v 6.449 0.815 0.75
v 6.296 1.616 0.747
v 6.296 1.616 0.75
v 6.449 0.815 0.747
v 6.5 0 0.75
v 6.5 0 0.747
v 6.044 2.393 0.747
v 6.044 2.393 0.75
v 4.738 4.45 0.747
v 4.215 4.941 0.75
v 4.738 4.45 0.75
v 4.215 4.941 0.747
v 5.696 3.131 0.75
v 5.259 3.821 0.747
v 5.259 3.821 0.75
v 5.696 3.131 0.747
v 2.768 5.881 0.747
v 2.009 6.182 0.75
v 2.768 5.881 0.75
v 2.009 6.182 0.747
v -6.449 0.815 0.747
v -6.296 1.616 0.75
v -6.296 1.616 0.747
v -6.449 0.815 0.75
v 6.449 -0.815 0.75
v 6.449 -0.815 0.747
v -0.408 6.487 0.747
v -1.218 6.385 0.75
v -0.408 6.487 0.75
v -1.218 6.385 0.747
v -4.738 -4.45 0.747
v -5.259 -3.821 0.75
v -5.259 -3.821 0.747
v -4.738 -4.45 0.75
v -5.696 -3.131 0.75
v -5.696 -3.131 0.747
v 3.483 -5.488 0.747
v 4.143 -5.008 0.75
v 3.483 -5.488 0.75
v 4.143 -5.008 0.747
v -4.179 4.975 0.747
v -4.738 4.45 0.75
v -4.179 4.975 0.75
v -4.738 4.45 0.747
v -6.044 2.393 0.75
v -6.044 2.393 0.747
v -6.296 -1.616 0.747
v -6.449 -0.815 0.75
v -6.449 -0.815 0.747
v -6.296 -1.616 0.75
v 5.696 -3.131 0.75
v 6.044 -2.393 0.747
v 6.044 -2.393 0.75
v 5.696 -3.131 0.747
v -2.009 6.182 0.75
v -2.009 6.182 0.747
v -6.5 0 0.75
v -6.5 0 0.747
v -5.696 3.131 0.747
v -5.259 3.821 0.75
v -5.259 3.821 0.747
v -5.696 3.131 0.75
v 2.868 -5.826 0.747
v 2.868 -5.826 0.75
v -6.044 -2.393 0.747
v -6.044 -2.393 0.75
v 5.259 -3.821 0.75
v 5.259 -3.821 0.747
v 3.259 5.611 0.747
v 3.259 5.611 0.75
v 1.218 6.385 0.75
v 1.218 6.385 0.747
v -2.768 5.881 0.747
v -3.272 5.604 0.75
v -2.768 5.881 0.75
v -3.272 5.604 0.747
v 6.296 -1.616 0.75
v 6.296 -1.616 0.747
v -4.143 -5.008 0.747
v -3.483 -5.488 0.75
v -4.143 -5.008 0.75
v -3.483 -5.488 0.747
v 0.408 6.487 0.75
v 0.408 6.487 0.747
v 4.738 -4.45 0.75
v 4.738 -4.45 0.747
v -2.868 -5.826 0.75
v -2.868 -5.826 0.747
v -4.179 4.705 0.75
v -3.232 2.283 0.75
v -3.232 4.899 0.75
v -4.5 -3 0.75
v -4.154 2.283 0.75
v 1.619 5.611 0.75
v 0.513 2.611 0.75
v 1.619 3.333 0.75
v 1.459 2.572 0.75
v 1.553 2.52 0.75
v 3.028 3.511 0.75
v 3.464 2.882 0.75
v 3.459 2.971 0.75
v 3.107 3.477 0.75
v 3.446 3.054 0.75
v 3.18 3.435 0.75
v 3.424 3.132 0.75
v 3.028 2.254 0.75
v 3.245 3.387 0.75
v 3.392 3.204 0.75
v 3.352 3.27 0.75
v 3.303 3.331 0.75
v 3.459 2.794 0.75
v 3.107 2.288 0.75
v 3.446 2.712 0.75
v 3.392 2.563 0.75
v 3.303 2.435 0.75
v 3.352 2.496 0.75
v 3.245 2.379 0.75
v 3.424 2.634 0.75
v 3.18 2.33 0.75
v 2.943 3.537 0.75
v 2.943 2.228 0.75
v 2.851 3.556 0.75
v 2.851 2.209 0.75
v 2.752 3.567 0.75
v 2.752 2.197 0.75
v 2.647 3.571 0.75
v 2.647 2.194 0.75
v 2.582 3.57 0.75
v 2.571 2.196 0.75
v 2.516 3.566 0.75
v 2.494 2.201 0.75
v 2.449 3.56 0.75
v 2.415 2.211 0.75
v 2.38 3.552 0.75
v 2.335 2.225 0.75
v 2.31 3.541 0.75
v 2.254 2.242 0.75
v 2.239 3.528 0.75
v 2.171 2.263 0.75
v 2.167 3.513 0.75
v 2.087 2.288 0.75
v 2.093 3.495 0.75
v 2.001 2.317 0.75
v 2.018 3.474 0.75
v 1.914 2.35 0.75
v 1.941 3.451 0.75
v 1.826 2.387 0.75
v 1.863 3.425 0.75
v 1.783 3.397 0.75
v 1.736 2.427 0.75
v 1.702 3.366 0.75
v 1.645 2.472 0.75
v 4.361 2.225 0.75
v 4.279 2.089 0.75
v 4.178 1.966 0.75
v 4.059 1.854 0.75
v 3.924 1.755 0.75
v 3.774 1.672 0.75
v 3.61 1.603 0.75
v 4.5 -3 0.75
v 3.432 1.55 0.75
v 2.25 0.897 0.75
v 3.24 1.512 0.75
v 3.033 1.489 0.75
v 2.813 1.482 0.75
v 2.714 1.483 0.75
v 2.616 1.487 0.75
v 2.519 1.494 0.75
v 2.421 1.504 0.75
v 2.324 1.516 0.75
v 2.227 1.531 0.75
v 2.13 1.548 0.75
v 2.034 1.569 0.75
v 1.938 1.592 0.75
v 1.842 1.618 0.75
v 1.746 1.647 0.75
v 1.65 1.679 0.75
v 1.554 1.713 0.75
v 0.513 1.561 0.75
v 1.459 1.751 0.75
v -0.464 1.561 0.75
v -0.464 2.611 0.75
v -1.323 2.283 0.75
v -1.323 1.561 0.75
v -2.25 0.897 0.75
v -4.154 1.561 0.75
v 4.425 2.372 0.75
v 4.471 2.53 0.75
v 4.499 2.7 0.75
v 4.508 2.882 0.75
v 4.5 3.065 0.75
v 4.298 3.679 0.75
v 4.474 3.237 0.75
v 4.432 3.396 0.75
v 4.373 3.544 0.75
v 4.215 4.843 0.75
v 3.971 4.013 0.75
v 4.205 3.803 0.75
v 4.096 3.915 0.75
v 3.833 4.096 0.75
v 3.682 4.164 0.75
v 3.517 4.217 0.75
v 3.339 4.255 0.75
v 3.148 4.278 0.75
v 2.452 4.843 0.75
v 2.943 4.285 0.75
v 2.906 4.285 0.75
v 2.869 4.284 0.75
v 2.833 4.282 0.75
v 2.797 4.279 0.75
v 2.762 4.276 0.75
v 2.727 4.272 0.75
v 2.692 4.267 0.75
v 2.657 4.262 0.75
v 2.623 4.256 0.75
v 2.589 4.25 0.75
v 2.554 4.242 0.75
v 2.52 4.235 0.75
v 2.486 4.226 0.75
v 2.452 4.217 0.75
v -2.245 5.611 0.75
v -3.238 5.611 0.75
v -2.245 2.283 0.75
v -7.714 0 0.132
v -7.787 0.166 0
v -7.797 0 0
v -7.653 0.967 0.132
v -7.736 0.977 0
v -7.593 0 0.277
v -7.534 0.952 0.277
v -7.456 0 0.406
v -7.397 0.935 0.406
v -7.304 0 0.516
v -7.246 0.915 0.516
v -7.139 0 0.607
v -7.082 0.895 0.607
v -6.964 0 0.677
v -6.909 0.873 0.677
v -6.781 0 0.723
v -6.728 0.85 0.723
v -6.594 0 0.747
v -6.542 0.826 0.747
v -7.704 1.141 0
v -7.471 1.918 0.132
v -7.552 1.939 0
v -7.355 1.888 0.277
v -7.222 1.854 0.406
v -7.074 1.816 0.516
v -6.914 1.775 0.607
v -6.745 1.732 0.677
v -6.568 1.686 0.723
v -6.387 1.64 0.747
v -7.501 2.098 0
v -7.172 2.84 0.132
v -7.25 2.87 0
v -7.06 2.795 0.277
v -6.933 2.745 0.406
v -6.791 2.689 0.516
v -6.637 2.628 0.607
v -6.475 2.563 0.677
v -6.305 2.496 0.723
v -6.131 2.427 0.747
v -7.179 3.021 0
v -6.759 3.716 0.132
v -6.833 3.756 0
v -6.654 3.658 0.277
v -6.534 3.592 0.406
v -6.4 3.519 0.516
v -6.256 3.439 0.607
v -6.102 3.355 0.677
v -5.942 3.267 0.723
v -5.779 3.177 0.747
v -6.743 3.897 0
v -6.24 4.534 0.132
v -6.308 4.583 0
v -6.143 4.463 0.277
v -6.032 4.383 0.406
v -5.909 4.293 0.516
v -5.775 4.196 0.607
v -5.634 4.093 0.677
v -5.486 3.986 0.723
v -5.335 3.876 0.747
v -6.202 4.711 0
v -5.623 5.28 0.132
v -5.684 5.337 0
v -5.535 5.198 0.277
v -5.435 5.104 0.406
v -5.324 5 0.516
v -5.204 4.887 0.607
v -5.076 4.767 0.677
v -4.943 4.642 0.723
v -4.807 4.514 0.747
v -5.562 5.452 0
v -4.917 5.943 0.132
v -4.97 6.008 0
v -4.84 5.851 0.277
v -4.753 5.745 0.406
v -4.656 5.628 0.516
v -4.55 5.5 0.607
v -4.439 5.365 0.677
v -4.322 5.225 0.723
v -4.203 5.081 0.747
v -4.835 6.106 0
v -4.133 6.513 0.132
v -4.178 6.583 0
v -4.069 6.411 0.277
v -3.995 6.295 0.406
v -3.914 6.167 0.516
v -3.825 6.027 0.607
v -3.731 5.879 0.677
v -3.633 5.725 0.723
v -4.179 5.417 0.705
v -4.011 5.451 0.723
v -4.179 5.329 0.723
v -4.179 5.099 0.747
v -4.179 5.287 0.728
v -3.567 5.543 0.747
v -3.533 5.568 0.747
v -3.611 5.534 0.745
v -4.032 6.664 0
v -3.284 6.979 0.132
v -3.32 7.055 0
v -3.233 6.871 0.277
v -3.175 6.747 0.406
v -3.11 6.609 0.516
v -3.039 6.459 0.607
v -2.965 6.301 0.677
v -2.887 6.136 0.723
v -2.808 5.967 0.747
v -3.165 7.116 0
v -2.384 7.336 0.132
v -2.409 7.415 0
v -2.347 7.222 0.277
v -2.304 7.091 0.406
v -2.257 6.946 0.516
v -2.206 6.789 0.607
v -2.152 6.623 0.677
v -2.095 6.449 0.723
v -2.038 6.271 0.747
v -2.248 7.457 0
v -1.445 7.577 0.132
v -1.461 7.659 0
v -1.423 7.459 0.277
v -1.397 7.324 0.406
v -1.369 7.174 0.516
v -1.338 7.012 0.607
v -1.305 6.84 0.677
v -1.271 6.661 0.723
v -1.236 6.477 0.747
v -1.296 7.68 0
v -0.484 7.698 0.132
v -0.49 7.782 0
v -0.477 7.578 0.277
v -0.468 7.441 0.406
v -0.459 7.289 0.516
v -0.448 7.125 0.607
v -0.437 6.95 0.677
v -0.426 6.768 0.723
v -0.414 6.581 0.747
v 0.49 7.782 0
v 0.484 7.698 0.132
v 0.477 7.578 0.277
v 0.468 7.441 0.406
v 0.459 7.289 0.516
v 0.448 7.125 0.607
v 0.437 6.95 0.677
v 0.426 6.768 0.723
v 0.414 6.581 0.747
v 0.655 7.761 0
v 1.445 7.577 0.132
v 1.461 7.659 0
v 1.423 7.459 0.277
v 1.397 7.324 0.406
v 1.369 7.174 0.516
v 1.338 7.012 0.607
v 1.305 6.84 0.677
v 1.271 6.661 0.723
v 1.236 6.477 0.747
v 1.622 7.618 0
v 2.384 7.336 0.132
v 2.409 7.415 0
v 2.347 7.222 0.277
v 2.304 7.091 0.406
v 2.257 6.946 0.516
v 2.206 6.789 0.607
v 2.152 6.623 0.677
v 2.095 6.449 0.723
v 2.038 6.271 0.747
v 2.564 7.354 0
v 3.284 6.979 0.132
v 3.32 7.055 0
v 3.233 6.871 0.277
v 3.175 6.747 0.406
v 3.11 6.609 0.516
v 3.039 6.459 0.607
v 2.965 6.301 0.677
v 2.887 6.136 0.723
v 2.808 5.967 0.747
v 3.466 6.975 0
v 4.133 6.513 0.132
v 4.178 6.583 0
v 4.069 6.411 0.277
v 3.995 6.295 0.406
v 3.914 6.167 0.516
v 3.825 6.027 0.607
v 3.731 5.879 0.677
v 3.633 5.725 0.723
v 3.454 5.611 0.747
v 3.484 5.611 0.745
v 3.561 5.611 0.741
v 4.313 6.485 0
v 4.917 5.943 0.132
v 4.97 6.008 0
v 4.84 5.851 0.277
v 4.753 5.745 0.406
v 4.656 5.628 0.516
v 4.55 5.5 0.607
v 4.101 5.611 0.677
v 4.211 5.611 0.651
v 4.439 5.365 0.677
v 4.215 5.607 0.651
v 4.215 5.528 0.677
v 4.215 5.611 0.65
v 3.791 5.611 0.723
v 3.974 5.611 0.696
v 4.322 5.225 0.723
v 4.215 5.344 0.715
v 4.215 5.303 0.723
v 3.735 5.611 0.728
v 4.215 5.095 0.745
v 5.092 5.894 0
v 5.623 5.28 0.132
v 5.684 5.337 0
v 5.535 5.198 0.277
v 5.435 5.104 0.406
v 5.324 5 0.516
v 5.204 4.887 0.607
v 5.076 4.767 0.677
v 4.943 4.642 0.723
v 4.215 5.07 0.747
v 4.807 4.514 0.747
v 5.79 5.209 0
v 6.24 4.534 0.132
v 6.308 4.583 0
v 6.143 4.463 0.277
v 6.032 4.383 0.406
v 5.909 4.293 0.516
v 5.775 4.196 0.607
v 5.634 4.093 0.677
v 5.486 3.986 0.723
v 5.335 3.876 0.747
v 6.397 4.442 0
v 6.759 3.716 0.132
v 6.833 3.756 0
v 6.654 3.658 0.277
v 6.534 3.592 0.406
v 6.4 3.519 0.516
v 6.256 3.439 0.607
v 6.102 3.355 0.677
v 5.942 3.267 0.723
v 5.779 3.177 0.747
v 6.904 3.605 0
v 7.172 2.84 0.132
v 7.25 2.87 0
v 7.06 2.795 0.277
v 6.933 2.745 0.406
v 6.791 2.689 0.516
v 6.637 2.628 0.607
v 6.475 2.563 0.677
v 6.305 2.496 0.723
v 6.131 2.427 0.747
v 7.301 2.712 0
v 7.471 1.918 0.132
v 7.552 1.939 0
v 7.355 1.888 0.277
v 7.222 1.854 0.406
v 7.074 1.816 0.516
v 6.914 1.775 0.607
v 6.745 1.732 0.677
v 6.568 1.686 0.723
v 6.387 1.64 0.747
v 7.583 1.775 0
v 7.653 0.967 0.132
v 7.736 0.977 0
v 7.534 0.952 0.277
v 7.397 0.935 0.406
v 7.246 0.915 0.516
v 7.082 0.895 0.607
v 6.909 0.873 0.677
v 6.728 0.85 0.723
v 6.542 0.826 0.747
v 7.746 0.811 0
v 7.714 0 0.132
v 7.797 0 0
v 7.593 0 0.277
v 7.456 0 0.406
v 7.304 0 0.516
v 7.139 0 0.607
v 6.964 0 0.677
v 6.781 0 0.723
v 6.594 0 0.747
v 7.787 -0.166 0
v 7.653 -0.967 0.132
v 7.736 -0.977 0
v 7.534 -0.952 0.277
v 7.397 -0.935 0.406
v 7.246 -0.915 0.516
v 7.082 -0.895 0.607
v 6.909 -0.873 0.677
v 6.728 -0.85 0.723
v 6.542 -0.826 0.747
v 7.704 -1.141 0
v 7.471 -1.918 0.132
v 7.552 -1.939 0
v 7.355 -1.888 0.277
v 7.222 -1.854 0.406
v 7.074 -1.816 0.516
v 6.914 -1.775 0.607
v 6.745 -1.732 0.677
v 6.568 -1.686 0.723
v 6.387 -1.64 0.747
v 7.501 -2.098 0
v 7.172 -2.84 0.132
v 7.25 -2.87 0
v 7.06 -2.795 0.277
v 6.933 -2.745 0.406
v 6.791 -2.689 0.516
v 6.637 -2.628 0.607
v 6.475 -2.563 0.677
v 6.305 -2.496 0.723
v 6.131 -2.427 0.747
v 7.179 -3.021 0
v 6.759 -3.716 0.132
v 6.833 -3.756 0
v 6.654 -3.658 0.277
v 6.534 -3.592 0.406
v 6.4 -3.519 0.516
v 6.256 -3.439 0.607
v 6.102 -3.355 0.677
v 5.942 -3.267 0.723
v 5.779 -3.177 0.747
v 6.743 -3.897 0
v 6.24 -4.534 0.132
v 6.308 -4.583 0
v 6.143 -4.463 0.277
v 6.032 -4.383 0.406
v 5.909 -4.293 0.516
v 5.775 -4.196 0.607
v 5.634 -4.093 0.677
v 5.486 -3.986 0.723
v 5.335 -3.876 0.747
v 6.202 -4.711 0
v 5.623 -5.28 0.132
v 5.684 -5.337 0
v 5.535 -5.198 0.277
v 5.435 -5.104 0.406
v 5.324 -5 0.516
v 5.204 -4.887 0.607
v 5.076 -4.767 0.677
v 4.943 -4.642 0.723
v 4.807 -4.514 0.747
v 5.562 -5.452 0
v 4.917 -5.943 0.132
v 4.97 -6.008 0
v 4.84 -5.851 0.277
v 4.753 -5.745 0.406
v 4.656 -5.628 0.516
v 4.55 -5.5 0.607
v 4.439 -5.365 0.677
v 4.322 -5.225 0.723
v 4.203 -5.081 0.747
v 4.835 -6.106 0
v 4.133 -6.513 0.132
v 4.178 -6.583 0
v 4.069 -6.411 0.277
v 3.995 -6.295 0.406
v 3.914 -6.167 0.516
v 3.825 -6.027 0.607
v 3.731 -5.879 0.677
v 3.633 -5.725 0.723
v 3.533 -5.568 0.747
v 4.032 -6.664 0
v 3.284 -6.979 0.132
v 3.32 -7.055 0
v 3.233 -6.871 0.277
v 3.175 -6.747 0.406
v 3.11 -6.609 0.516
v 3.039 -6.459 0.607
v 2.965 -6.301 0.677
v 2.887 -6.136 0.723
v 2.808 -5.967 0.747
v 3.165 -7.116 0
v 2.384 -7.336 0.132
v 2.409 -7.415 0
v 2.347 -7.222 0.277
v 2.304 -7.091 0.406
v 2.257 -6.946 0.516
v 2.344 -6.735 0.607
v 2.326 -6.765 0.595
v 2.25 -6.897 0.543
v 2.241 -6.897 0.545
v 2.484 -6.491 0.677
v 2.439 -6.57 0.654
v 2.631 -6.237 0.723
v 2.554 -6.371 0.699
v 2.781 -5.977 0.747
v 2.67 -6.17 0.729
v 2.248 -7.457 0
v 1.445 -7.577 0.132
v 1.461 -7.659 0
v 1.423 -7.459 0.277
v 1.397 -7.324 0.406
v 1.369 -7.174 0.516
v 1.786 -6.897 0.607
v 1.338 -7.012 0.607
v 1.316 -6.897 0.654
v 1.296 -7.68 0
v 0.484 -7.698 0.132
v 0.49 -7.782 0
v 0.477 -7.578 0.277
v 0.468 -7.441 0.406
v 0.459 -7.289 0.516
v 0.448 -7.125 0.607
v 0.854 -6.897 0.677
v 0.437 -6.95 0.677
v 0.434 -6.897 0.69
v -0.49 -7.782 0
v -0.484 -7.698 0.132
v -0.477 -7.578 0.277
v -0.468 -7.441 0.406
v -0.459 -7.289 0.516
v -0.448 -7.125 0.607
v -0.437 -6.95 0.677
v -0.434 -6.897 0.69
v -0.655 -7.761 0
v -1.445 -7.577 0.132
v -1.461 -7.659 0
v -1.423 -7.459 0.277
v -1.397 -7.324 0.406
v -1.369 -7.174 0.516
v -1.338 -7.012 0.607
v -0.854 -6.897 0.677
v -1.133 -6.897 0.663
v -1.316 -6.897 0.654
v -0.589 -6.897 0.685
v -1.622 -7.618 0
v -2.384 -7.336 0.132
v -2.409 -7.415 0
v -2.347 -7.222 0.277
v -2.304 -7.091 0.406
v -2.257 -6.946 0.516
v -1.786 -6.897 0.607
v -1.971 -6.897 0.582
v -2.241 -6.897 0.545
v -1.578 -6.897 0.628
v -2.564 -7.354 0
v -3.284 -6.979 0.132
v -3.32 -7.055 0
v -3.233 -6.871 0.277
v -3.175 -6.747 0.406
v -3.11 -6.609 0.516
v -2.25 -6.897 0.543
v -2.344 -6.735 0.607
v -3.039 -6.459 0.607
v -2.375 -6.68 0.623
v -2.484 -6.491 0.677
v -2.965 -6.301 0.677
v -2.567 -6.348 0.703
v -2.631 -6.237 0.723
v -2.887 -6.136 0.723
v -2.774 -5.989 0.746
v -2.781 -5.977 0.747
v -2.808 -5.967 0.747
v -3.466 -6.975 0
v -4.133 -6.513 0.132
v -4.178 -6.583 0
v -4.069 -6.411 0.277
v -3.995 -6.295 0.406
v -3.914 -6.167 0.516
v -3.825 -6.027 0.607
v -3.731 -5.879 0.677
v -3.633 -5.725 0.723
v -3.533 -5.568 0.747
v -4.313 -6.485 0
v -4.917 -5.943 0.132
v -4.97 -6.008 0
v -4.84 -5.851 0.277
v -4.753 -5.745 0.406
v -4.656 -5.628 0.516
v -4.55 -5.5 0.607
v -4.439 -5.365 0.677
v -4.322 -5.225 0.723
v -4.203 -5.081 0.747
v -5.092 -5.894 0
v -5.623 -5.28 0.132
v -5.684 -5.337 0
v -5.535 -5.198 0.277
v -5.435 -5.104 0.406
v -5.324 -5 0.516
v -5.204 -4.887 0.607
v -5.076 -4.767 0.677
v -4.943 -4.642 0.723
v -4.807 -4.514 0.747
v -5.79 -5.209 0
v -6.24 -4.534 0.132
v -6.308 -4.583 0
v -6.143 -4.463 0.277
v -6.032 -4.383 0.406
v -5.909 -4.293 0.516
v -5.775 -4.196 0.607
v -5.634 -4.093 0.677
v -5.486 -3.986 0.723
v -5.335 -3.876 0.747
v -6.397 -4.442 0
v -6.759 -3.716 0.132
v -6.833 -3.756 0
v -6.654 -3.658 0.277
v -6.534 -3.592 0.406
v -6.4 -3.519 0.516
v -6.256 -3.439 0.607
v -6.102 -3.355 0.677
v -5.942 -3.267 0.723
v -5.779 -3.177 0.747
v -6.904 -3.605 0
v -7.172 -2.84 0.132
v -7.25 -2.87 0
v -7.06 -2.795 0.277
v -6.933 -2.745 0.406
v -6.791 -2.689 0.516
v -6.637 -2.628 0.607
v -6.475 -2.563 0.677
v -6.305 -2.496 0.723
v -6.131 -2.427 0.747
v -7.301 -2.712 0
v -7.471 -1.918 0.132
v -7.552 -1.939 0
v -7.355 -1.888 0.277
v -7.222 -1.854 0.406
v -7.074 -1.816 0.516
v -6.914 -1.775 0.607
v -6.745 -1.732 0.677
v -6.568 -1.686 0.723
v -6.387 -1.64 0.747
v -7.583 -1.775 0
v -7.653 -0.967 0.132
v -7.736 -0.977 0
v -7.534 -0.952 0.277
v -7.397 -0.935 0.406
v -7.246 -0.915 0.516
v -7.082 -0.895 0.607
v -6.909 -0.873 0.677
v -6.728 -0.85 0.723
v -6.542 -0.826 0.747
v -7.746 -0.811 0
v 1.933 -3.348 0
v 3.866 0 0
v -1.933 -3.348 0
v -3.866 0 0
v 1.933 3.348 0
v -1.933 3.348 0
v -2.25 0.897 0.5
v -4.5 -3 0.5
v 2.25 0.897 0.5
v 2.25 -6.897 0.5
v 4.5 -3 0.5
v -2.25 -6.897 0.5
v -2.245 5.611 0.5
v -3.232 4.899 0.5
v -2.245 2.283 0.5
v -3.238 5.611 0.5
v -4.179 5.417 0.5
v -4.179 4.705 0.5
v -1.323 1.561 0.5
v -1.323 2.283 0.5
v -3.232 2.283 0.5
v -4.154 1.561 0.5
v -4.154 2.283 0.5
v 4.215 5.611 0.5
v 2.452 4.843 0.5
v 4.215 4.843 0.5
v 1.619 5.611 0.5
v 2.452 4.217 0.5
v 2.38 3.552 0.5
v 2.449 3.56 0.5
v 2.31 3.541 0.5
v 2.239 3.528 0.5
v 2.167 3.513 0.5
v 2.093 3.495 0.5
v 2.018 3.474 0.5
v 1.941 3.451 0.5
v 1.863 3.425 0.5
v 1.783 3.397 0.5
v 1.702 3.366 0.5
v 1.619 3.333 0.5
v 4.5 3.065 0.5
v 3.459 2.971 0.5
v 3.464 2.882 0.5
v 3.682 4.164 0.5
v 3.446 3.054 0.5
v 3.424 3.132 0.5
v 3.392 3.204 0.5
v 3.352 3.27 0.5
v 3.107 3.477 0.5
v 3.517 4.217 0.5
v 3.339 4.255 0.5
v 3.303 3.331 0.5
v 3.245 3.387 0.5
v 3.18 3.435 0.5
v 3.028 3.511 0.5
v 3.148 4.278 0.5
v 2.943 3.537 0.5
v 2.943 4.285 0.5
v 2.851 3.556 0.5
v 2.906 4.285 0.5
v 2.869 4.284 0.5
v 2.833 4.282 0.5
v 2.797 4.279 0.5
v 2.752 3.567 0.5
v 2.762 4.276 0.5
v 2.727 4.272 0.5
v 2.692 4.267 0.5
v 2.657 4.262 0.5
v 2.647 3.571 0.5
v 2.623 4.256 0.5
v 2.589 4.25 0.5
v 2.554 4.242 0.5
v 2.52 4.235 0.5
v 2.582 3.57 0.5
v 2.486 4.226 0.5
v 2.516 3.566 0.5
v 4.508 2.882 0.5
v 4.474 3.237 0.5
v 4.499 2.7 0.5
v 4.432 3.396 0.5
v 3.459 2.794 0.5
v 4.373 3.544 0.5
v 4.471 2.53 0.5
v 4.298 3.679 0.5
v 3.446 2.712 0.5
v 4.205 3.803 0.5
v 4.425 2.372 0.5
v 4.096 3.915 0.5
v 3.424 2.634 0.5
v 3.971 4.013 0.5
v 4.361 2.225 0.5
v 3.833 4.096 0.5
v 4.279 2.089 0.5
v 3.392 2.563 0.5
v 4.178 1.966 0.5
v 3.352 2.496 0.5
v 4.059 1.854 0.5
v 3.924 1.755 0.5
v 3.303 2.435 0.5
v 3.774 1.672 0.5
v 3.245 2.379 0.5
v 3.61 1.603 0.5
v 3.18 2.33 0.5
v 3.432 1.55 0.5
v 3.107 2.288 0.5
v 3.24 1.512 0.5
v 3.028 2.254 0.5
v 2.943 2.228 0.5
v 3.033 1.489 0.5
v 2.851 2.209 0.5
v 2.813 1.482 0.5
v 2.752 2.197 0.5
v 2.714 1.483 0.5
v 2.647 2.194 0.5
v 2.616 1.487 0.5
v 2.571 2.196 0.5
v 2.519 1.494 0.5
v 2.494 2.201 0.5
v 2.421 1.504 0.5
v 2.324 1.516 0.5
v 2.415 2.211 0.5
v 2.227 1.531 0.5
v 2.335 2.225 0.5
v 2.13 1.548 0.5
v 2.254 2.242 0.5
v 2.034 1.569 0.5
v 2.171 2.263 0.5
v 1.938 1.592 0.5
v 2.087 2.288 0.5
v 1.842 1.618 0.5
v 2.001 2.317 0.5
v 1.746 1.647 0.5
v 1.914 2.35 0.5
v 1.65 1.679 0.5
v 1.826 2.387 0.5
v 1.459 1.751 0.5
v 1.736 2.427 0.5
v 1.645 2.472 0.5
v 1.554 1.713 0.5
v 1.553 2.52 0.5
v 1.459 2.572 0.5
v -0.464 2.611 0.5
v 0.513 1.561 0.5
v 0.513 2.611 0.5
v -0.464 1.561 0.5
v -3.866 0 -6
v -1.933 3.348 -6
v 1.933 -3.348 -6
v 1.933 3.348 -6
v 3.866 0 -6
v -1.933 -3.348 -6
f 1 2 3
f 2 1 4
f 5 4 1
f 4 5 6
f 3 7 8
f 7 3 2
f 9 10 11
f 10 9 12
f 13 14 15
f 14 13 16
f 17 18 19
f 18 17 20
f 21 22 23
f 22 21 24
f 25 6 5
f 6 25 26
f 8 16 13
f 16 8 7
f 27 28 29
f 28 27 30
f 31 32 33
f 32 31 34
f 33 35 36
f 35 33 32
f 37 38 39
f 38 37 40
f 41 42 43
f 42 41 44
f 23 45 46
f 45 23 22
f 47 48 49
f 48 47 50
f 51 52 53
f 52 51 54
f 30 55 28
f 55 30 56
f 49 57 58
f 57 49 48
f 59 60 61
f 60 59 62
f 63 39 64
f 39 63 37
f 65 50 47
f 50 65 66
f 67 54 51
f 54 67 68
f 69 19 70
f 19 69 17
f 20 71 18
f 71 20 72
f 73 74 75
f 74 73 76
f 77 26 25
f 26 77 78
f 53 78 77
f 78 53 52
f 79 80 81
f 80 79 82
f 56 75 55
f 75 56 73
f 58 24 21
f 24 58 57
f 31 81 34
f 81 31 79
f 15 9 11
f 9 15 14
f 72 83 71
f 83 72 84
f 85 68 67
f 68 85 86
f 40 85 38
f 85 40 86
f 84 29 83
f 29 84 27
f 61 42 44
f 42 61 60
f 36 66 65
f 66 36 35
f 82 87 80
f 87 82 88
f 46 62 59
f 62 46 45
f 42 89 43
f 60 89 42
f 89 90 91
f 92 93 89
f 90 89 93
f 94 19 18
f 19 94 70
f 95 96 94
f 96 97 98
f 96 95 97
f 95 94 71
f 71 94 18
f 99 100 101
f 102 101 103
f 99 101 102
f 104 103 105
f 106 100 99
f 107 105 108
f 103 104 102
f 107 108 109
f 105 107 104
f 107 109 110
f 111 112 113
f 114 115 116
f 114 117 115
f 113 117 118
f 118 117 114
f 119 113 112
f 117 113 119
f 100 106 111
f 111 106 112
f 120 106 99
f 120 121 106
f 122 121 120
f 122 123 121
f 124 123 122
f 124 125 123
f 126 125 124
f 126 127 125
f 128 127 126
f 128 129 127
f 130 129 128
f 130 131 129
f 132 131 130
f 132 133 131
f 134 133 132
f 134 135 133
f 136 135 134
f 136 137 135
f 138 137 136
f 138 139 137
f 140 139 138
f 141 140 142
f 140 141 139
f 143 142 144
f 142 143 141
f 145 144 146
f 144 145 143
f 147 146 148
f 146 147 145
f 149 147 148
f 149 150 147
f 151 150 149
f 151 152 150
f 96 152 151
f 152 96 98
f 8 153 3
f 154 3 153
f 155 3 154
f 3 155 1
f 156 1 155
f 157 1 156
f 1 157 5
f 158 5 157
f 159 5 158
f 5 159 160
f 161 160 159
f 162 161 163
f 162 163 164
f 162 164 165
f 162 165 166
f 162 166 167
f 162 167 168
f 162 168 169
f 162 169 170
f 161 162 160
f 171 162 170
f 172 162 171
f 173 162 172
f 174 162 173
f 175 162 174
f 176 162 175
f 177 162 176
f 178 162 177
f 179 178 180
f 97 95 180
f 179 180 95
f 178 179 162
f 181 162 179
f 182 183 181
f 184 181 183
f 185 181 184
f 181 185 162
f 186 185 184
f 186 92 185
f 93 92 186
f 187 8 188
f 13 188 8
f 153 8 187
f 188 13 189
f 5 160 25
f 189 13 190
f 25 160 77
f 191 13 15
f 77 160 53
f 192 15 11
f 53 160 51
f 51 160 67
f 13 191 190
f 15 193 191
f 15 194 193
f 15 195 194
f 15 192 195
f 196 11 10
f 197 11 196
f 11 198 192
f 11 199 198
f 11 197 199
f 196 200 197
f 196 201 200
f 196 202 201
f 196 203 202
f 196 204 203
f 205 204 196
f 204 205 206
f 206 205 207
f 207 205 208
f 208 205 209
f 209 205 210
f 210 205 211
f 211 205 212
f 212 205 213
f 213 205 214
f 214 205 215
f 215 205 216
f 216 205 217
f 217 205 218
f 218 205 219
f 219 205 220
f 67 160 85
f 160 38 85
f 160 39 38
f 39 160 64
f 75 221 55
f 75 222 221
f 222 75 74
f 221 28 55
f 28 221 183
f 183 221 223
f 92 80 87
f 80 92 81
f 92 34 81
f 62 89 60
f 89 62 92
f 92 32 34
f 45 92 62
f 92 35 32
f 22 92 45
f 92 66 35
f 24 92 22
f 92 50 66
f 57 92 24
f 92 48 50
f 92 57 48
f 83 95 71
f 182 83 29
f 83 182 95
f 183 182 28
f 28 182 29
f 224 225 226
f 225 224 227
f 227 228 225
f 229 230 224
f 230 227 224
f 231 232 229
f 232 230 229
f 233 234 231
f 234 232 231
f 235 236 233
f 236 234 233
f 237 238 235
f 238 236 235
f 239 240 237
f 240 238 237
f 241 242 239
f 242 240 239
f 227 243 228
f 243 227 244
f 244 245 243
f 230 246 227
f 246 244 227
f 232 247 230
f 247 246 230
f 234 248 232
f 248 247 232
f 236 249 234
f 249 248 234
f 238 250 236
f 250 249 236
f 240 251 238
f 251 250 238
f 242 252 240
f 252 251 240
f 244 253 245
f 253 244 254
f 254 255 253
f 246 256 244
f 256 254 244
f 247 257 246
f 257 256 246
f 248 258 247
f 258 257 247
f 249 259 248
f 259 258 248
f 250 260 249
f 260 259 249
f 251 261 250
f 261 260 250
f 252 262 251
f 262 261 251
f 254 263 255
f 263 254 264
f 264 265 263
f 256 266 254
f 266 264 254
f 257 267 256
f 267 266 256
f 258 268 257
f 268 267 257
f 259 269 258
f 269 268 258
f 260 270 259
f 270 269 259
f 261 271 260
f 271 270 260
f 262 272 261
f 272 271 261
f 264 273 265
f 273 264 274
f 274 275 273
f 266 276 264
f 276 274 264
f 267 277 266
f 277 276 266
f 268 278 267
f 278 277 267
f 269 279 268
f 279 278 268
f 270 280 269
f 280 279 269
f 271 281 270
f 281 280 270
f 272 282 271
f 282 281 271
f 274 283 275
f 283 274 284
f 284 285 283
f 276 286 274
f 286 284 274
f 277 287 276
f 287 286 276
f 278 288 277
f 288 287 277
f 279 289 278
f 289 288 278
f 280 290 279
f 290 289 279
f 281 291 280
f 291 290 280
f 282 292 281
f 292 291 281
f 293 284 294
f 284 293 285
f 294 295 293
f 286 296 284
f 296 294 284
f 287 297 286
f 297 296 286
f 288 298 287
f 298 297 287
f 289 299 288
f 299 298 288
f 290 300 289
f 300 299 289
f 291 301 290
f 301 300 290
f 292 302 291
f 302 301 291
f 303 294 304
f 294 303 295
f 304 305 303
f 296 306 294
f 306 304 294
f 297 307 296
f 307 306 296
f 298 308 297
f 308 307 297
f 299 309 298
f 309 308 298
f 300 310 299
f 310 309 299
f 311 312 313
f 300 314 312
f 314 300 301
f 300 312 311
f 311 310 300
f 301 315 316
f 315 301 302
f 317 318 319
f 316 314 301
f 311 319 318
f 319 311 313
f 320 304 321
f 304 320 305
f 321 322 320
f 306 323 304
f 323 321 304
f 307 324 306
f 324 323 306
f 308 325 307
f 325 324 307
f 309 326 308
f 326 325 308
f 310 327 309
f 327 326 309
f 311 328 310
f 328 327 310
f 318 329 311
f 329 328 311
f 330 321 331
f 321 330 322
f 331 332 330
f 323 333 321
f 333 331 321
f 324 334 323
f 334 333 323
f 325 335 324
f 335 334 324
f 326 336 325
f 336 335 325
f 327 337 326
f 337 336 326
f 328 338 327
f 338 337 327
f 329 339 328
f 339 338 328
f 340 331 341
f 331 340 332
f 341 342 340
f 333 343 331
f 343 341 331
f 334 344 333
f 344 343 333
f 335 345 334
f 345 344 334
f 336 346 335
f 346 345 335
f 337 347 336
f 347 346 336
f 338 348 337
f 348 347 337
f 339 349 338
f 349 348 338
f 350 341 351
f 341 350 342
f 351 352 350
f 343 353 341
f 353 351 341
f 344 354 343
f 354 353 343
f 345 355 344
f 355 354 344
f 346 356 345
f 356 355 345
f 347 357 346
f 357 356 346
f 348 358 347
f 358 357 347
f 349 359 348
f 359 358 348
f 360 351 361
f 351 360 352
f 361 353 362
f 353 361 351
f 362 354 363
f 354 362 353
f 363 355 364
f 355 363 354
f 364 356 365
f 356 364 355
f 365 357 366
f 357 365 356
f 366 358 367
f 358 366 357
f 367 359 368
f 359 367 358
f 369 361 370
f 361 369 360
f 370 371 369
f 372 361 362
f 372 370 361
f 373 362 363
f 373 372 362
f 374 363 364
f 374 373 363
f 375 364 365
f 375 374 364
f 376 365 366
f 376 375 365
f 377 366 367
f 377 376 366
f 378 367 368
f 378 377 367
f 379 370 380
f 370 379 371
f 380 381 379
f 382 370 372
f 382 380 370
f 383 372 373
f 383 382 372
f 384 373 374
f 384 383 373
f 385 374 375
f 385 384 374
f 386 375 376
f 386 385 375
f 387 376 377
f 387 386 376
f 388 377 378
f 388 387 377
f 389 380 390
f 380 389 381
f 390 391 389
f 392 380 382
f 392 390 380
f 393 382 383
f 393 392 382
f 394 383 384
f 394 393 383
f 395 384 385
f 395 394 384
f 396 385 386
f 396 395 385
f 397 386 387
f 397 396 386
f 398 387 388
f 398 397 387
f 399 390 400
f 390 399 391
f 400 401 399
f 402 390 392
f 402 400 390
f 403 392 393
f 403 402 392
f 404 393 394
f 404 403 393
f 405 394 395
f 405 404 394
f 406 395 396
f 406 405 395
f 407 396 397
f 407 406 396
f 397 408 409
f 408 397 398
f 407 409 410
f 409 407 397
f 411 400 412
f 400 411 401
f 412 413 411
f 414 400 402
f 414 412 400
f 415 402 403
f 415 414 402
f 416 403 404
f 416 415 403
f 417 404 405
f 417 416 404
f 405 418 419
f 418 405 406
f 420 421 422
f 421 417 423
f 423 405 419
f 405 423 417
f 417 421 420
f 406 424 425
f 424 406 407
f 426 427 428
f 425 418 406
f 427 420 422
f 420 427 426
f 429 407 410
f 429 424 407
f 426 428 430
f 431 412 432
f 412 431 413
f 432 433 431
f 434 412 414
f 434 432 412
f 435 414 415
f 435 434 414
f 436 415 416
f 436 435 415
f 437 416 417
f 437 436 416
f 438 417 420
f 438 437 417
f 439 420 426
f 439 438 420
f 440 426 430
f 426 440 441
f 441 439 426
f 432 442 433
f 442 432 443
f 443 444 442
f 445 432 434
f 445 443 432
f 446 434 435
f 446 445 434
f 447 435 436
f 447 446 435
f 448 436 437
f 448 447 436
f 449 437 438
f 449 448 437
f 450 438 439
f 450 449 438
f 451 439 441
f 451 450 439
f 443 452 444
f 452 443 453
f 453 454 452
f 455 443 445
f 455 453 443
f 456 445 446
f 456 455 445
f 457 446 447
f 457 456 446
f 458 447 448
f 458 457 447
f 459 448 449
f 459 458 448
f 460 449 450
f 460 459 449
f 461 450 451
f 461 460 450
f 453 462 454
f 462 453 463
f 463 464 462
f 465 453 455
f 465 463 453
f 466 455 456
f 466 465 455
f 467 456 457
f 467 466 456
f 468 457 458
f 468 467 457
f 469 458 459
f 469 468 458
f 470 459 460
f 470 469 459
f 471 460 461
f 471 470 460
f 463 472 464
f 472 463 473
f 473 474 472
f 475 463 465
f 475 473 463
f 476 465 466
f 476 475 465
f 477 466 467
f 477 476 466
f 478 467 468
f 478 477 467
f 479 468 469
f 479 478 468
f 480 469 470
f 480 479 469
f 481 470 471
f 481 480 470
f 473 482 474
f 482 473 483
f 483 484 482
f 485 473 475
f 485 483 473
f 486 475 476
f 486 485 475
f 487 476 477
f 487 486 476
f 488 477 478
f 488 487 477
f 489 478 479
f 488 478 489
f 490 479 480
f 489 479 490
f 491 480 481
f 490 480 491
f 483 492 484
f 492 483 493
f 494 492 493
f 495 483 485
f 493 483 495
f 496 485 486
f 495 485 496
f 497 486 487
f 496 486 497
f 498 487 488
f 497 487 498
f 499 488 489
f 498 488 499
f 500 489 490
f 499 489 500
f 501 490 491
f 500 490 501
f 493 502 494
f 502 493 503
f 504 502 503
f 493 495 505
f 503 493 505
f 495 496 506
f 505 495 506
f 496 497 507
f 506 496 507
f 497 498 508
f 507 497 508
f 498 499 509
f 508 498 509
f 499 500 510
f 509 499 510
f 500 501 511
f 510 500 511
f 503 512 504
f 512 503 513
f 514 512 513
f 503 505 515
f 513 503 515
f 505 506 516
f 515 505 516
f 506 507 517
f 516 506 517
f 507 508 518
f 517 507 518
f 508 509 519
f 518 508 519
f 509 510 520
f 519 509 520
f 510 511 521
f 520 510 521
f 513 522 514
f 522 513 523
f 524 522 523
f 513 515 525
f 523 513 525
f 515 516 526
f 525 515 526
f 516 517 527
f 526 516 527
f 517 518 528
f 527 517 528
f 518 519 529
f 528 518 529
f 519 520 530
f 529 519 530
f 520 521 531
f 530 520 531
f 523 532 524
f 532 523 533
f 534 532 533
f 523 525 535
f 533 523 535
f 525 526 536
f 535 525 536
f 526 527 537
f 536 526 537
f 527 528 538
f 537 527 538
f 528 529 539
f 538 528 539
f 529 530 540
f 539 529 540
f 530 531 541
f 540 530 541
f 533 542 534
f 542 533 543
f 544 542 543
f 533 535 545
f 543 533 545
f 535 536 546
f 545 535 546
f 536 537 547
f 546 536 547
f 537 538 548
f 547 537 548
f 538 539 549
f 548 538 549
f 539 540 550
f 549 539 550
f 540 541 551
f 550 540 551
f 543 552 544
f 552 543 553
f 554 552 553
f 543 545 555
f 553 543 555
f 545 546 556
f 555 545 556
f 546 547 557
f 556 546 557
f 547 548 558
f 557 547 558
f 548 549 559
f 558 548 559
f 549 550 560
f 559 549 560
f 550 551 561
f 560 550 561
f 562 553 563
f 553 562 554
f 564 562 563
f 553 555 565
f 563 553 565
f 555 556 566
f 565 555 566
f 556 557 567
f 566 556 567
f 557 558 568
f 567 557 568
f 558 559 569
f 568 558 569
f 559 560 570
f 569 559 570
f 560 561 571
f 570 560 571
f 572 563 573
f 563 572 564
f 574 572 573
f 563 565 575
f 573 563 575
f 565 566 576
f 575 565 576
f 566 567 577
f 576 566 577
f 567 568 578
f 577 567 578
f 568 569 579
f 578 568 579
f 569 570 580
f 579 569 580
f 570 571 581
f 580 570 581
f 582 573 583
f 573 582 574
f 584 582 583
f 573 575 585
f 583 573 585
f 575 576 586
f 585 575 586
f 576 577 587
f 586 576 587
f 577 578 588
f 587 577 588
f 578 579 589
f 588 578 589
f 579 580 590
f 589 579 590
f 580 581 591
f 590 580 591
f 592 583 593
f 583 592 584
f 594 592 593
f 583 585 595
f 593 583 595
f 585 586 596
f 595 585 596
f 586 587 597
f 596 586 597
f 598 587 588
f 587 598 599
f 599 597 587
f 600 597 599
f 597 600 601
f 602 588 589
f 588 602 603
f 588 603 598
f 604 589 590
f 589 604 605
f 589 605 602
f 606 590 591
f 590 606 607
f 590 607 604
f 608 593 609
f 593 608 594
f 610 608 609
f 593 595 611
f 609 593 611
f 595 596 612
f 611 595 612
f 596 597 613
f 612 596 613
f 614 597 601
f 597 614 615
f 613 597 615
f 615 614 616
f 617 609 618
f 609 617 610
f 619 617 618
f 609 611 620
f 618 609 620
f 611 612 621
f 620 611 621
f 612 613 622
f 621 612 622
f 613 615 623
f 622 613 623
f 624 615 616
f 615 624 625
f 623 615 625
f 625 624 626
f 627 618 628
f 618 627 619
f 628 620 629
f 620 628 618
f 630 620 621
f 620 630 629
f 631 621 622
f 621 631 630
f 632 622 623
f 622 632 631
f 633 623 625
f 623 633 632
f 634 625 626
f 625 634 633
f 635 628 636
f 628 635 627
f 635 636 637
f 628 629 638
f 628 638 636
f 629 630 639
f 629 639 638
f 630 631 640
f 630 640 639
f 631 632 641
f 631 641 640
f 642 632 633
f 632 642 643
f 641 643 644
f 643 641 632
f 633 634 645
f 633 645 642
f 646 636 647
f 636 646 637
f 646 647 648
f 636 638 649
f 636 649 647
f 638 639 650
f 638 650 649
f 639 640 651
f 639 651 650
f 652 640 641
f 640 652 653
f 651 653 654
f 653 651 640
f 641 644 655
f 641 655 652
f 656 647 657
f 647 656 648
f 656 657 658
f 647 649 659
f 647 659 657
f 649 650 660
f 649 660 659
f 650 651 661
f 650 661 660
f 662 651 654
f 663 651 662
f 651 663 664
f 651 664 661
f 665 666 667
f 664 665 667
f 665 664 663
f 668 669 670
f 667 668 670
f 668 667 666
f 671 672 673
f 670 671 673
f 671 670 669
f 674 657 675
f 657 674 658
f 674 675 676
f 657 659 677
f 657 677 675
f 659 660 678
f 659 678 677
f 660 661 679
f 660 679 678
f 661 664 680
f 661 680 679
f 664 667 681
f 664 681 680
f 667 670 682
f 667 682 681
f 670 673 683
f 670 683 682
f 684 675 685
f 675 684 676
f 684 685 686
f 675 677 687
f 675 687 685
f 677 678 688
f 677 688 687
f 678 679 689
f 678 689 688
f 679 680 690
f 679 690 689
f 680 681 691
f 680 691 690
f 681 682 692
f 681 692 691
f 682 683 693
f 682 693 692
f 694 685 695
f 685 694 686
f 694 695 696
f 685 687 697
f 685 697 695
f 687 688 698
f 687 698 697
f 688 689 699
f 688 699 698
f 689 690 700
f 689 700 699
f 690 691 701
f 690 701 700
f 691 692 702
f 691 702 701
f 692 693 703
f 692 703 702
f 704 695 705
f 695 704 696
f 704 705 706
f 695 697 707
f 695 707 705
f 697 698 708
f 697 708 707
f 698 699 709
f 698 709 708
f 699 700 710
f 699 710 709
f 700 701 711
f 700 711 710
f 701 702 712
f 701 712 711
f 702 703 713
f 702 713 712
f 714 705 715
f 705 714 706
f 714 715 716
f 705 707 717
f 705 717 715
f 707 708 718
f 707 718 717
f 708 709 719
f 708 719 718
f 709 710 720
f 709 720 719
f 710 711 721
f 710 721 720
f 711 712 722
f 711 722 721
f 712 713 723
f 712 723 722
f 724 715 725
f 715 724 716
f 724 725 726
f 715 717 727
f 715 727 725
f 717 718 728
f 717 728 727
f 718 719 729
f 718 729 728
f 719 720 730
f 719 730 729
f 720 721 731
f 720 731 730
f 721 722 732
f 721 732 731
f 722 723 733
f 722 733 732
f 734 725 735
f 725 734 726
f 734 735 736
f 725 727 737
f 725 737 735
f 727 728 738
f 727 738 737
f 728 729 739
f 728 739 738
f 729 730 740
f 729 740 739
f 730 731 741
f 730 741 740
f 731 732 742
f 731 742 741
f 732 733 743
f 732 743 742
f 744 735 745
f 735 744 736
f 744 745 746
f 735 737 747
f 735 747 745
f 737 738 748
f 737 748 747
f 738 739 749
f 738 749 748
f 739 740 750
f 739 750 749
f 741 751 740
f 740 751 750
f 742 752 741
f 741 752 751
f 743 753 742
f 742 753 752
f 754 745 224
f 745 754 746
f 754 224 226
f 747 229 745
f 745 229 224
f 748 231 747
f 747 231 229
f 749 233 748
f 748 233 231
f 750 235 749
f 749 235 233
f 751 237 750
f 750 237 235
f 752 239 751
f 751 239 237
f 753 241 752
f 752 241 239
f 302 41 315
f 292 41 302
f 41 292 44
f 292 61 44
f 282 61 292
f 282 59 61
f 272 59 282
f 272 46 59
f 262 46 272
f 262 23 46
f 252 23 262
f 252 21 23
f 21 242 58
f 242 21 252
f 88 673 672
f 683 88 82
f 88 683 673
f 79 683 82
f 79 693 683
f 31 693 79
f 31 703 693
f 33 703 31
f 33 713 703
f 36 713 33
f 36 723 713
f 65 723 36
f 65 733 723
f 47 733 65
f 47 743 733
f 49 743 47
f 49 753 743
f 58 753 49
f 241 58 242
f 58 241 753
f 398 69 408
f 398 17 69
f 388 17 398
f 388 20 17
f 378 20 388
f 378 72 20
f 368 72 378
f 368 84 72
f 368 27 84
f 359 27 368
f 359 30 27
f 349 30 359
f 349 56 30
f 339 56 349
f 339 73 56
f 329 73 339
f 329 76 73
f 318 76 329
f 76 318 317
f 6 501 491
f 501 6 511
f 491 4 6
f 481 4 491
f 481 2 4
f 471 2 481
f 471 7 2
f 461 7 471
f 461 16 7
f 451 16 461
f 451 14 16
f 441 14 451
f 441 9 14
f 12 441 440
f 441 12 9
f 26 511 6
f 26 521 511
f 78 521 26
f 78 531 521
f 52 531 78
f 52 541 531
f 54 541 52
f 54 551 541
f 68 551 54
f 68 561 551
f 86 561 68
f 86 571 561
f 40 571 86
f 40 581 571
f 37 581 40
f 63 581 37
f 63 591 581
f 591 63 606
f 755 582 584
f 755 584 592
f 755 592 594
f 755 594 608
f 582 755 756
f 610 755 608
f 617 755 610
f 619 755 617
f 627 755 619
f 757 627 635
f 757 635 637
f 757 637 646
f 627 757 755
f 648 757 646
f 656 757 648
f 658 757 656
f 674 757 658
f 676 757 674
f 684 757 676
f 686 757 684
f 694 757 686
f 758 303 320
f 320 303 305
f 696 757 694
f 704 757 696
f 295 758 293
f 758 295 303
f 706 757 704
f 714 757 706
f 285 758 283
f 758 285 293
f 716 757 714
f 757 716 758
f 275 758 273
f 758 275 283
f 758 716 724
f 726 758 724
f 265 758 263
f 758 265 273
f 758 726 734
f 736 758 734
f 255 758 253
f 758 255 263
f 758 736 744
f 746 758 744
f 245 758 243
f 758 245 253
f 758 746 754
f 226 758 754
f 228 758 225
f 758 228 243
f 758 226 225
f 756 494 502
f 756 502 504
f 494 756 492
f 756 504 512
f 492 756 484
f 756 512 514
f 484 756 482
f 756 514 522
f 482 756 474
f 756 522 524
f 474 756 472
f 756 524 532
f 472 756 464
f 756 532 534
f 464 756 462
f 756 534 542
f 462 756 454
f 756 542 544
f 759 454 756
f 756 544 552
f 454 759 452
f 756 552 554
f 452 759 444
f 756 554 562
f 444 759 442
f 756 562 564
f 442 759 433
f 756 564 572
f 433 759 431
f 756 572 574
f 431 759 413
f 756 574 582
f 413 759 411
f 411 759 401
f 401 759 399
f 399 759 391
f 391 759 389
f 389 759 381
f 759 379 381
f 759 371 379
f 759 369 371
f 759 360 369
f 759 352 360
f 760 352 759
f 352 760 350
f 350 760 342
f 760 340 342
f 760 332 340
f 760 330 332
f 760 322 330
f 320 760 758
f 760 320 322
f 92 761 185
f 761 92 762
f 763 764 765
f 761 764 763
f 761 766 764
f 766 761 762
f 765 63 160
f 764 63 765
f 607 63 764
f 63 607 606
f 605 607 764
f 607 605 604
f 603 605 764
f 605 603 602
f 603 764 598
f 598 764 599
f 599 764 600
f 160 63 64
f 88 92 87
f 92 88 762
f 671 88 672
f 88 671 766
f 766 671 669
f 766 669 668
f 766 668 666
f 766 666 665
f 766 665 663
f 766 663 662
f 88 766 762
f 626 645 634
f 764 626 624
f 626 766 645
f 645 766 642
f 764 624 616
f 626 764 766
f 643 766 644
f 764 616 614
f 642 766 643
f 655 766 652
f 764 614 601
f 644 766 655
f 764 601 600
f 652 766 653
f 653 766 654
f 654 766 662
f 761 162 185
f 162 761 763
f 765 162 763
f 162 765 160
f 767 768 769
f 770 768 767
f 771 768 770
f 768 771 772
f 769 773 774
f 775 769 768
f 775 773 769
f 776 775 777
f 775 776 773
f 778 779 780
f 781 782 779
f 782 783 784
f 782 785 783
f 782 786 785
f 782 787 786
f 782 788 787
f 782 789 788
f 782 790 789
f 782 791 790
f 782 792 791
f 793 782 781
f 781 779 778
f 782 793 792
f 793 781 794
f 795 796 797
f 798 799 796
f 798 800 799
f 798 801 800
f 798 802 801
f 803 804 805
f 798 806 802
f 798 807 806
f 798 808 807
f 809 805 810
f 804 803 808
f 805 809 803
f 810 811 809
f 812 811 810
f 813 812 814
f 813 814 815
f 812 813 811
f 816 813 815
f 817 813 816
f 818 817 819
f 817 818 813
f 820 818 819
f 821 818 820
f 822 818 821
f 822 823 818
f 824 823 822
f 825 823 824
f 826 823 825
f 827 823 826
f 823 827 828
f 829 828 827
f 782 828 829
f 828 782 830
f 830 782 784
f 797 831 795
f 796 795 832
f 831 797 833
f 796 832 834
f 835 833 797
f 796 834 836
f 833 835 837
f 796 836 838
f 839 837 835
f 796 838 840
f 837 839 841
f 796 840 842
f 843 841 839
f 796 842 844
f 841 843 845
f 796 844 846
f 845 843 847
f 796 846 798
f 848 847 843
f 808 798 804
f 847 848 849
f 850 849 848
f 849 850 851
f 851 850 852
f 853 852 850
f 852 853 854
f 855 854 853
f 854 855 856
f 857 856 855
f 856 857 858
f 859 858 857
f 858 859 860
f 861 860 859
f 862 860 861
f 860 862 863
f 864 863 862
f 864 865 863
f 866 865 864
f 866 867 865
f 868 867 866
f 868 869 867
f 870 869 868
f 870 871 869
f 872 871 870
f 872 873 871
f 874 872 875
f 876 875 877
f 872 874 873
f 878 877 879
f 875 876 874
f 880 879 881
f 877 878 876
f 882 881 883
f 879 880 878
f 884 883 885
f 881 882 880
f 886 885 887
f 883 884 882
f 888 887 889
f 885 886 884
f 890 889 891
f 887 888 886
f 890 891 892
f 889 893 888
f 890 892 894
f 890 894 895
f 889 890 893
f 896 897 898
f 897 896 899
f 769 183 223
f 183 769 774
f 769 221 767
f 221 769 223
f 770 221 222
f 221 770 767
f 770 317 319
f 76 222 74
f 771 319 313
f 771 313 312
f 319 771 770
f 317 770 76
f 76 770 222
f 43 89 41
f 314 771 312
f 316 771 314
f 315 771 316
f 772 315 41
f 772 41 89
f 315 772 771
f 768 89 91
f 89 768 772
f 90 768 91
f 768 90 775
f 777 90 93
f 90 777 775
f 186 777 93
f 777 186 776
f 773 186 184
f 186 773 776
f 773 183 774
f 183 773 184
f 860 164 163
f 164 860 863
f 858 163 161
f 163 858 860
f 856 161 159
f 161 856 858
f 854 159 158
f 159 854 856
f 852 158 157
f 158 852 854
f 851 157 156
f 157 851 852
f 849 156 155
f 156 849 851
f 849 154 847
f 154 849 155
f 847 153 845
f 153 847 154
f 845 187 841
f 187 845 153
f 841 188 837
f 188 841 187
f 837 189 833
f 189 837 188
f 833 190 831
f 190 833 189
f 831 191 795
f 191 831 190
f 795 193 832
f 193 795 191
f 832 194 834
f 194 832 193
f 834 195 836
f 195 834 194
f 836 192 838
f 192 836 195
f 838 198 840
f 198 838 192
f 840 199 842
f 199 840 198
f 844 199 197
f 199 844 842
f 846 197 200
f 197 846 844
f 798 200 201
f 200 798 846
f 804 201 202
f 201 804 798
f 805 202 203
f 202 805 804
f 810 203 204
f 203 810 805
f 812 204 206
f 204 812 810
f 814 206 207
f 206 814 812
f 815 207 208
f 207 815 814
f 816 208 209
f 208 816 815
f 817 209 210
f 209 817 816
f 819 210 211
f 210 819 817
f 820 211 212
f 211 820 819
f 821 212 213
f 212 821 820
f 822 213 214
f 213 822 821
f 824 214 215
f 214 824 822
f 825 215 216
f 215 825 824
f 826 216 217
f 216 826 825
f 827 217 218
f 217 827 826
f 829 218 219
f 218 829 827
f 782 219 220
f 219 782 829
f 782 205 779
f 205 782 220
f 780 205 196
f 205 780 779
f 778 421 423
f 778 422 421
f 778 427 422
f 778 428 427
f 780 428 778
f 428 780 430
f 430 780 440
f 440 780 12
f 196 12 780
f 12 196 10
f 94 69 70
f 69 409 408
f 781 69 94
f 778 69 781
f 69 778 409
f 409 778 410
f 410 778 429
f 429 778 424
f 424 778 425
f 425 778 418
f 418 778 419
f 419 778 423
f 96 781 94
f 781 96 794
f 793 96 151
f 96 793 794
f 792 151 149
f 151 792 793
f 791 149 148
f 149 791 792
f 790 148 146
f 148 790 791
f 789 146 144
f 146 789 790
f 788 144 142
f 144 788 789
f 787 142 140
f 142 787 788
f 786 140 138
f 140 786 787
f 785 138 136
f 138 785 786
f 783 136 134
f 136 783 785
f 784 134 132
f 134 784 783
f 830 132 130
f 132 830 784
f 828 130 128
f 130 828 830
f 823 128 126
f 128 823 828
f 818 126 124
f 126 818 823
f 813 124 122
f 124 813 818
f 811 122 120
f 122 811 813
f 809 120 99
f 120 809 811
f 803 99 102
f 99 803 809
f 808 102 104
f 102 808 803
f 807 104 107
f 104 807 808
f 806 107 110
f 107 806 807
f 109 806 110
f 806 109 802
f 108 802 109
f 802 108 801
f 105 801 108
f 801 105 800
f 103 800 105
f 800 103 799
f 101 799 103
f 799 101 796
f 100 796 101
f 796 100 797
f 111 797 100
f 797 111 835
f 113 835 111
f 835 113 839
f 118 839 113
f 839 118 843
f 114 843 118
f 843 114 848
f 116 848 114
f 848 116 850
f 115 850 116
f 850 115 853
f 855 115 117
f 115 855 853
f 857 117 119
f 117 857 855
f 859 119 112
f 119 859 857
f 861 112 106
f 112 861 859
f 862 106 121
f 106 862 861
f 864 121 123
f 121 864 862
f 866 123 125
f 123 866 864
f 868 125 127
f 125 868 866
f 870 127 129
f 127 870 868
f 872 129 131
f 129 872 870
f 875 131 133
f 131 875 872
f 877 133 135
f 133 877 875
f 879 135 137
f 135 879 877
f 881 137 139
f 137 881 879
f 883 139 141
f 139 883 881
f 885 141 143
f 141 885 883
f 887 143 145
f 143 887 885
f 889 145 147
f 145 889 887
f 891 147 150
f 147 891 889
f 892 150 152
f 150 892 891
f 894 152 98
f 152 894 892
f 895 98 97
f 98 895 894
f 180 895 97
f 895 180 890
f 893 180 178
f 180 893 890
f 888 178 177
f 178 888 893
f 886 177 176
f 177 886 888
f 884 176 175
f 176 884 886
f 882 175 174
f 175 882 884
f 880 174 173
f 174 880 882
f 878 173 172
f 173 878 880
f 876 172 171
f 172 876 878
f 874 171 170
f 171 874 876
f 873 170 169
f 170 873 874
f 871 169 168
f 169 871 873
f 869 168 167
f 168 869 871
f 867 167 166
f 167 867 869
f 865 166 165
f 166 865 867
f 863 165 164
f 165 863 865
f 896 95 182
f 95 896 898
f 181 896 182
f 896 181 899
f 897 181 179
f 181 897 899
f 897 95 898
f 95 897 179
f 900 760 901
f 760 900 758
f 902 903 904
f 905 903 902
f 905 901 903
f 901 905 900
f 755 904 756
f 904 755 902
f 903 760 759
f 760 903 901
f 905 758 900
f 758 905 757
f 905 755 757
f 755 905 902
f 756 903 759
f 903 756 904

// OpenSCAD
$fn = 50;


union() {
	difference() {
		union() {
			translate(v = [0, 0, -0.7500000000]) {
				cylinder(h = 1.5000000000, r = 6.5000000000);
			}
			translate(v = [0, 0, -0.7500000000]) {
				rotate_extrude(angle = 360) {
					translate(v = [6.5000000000, 0, 0]) {
						circle(r = 1.5000000000);
					}
				}
			}
		}
		union() {
			translate(v = [-25.0000000000, -25.0000000000, -50]) {
				cube(size = [50, 50, 50]);
			}
			translate(v = [0, -3, 0.5000000000]) {
				#linear_extrude(height = 0.2500000000) {
					polygon(points = [[4.5000000000, 0.0000000000], [2.2500000000, 3.8971143170], [-2.2500000000, 3.8971143170], [-4.5000000000, 0.0000000000], [-2.2500000000, -3.8971143170], [2.2500000000, -3.8971143170]]);
				}
			}
			#translate(v = [0, 3.5000000000, 0.5000000000]) {
				linear_extrude(height = 0.2500000000) {
					text(font = "SegoiUI:Bold", halign = "center", size = 4, text = "1.5", valign = "center");
				}
			}
		}
	}
	union() {
		translate(v = [0, 0, -6]) {
			linear_extrude(height = 6) {
				polygon(points = [[3.8658550000, 0.0000000000], [1.9329275000, 3.3479286373], [-1.9329275000, 3.3479286373], [-3.8658550000, 0.0000000000], [-1.9329275000, -3.3479286373], [1.9329275000, -3.3479286373]]);
			}
		}
	}
}
